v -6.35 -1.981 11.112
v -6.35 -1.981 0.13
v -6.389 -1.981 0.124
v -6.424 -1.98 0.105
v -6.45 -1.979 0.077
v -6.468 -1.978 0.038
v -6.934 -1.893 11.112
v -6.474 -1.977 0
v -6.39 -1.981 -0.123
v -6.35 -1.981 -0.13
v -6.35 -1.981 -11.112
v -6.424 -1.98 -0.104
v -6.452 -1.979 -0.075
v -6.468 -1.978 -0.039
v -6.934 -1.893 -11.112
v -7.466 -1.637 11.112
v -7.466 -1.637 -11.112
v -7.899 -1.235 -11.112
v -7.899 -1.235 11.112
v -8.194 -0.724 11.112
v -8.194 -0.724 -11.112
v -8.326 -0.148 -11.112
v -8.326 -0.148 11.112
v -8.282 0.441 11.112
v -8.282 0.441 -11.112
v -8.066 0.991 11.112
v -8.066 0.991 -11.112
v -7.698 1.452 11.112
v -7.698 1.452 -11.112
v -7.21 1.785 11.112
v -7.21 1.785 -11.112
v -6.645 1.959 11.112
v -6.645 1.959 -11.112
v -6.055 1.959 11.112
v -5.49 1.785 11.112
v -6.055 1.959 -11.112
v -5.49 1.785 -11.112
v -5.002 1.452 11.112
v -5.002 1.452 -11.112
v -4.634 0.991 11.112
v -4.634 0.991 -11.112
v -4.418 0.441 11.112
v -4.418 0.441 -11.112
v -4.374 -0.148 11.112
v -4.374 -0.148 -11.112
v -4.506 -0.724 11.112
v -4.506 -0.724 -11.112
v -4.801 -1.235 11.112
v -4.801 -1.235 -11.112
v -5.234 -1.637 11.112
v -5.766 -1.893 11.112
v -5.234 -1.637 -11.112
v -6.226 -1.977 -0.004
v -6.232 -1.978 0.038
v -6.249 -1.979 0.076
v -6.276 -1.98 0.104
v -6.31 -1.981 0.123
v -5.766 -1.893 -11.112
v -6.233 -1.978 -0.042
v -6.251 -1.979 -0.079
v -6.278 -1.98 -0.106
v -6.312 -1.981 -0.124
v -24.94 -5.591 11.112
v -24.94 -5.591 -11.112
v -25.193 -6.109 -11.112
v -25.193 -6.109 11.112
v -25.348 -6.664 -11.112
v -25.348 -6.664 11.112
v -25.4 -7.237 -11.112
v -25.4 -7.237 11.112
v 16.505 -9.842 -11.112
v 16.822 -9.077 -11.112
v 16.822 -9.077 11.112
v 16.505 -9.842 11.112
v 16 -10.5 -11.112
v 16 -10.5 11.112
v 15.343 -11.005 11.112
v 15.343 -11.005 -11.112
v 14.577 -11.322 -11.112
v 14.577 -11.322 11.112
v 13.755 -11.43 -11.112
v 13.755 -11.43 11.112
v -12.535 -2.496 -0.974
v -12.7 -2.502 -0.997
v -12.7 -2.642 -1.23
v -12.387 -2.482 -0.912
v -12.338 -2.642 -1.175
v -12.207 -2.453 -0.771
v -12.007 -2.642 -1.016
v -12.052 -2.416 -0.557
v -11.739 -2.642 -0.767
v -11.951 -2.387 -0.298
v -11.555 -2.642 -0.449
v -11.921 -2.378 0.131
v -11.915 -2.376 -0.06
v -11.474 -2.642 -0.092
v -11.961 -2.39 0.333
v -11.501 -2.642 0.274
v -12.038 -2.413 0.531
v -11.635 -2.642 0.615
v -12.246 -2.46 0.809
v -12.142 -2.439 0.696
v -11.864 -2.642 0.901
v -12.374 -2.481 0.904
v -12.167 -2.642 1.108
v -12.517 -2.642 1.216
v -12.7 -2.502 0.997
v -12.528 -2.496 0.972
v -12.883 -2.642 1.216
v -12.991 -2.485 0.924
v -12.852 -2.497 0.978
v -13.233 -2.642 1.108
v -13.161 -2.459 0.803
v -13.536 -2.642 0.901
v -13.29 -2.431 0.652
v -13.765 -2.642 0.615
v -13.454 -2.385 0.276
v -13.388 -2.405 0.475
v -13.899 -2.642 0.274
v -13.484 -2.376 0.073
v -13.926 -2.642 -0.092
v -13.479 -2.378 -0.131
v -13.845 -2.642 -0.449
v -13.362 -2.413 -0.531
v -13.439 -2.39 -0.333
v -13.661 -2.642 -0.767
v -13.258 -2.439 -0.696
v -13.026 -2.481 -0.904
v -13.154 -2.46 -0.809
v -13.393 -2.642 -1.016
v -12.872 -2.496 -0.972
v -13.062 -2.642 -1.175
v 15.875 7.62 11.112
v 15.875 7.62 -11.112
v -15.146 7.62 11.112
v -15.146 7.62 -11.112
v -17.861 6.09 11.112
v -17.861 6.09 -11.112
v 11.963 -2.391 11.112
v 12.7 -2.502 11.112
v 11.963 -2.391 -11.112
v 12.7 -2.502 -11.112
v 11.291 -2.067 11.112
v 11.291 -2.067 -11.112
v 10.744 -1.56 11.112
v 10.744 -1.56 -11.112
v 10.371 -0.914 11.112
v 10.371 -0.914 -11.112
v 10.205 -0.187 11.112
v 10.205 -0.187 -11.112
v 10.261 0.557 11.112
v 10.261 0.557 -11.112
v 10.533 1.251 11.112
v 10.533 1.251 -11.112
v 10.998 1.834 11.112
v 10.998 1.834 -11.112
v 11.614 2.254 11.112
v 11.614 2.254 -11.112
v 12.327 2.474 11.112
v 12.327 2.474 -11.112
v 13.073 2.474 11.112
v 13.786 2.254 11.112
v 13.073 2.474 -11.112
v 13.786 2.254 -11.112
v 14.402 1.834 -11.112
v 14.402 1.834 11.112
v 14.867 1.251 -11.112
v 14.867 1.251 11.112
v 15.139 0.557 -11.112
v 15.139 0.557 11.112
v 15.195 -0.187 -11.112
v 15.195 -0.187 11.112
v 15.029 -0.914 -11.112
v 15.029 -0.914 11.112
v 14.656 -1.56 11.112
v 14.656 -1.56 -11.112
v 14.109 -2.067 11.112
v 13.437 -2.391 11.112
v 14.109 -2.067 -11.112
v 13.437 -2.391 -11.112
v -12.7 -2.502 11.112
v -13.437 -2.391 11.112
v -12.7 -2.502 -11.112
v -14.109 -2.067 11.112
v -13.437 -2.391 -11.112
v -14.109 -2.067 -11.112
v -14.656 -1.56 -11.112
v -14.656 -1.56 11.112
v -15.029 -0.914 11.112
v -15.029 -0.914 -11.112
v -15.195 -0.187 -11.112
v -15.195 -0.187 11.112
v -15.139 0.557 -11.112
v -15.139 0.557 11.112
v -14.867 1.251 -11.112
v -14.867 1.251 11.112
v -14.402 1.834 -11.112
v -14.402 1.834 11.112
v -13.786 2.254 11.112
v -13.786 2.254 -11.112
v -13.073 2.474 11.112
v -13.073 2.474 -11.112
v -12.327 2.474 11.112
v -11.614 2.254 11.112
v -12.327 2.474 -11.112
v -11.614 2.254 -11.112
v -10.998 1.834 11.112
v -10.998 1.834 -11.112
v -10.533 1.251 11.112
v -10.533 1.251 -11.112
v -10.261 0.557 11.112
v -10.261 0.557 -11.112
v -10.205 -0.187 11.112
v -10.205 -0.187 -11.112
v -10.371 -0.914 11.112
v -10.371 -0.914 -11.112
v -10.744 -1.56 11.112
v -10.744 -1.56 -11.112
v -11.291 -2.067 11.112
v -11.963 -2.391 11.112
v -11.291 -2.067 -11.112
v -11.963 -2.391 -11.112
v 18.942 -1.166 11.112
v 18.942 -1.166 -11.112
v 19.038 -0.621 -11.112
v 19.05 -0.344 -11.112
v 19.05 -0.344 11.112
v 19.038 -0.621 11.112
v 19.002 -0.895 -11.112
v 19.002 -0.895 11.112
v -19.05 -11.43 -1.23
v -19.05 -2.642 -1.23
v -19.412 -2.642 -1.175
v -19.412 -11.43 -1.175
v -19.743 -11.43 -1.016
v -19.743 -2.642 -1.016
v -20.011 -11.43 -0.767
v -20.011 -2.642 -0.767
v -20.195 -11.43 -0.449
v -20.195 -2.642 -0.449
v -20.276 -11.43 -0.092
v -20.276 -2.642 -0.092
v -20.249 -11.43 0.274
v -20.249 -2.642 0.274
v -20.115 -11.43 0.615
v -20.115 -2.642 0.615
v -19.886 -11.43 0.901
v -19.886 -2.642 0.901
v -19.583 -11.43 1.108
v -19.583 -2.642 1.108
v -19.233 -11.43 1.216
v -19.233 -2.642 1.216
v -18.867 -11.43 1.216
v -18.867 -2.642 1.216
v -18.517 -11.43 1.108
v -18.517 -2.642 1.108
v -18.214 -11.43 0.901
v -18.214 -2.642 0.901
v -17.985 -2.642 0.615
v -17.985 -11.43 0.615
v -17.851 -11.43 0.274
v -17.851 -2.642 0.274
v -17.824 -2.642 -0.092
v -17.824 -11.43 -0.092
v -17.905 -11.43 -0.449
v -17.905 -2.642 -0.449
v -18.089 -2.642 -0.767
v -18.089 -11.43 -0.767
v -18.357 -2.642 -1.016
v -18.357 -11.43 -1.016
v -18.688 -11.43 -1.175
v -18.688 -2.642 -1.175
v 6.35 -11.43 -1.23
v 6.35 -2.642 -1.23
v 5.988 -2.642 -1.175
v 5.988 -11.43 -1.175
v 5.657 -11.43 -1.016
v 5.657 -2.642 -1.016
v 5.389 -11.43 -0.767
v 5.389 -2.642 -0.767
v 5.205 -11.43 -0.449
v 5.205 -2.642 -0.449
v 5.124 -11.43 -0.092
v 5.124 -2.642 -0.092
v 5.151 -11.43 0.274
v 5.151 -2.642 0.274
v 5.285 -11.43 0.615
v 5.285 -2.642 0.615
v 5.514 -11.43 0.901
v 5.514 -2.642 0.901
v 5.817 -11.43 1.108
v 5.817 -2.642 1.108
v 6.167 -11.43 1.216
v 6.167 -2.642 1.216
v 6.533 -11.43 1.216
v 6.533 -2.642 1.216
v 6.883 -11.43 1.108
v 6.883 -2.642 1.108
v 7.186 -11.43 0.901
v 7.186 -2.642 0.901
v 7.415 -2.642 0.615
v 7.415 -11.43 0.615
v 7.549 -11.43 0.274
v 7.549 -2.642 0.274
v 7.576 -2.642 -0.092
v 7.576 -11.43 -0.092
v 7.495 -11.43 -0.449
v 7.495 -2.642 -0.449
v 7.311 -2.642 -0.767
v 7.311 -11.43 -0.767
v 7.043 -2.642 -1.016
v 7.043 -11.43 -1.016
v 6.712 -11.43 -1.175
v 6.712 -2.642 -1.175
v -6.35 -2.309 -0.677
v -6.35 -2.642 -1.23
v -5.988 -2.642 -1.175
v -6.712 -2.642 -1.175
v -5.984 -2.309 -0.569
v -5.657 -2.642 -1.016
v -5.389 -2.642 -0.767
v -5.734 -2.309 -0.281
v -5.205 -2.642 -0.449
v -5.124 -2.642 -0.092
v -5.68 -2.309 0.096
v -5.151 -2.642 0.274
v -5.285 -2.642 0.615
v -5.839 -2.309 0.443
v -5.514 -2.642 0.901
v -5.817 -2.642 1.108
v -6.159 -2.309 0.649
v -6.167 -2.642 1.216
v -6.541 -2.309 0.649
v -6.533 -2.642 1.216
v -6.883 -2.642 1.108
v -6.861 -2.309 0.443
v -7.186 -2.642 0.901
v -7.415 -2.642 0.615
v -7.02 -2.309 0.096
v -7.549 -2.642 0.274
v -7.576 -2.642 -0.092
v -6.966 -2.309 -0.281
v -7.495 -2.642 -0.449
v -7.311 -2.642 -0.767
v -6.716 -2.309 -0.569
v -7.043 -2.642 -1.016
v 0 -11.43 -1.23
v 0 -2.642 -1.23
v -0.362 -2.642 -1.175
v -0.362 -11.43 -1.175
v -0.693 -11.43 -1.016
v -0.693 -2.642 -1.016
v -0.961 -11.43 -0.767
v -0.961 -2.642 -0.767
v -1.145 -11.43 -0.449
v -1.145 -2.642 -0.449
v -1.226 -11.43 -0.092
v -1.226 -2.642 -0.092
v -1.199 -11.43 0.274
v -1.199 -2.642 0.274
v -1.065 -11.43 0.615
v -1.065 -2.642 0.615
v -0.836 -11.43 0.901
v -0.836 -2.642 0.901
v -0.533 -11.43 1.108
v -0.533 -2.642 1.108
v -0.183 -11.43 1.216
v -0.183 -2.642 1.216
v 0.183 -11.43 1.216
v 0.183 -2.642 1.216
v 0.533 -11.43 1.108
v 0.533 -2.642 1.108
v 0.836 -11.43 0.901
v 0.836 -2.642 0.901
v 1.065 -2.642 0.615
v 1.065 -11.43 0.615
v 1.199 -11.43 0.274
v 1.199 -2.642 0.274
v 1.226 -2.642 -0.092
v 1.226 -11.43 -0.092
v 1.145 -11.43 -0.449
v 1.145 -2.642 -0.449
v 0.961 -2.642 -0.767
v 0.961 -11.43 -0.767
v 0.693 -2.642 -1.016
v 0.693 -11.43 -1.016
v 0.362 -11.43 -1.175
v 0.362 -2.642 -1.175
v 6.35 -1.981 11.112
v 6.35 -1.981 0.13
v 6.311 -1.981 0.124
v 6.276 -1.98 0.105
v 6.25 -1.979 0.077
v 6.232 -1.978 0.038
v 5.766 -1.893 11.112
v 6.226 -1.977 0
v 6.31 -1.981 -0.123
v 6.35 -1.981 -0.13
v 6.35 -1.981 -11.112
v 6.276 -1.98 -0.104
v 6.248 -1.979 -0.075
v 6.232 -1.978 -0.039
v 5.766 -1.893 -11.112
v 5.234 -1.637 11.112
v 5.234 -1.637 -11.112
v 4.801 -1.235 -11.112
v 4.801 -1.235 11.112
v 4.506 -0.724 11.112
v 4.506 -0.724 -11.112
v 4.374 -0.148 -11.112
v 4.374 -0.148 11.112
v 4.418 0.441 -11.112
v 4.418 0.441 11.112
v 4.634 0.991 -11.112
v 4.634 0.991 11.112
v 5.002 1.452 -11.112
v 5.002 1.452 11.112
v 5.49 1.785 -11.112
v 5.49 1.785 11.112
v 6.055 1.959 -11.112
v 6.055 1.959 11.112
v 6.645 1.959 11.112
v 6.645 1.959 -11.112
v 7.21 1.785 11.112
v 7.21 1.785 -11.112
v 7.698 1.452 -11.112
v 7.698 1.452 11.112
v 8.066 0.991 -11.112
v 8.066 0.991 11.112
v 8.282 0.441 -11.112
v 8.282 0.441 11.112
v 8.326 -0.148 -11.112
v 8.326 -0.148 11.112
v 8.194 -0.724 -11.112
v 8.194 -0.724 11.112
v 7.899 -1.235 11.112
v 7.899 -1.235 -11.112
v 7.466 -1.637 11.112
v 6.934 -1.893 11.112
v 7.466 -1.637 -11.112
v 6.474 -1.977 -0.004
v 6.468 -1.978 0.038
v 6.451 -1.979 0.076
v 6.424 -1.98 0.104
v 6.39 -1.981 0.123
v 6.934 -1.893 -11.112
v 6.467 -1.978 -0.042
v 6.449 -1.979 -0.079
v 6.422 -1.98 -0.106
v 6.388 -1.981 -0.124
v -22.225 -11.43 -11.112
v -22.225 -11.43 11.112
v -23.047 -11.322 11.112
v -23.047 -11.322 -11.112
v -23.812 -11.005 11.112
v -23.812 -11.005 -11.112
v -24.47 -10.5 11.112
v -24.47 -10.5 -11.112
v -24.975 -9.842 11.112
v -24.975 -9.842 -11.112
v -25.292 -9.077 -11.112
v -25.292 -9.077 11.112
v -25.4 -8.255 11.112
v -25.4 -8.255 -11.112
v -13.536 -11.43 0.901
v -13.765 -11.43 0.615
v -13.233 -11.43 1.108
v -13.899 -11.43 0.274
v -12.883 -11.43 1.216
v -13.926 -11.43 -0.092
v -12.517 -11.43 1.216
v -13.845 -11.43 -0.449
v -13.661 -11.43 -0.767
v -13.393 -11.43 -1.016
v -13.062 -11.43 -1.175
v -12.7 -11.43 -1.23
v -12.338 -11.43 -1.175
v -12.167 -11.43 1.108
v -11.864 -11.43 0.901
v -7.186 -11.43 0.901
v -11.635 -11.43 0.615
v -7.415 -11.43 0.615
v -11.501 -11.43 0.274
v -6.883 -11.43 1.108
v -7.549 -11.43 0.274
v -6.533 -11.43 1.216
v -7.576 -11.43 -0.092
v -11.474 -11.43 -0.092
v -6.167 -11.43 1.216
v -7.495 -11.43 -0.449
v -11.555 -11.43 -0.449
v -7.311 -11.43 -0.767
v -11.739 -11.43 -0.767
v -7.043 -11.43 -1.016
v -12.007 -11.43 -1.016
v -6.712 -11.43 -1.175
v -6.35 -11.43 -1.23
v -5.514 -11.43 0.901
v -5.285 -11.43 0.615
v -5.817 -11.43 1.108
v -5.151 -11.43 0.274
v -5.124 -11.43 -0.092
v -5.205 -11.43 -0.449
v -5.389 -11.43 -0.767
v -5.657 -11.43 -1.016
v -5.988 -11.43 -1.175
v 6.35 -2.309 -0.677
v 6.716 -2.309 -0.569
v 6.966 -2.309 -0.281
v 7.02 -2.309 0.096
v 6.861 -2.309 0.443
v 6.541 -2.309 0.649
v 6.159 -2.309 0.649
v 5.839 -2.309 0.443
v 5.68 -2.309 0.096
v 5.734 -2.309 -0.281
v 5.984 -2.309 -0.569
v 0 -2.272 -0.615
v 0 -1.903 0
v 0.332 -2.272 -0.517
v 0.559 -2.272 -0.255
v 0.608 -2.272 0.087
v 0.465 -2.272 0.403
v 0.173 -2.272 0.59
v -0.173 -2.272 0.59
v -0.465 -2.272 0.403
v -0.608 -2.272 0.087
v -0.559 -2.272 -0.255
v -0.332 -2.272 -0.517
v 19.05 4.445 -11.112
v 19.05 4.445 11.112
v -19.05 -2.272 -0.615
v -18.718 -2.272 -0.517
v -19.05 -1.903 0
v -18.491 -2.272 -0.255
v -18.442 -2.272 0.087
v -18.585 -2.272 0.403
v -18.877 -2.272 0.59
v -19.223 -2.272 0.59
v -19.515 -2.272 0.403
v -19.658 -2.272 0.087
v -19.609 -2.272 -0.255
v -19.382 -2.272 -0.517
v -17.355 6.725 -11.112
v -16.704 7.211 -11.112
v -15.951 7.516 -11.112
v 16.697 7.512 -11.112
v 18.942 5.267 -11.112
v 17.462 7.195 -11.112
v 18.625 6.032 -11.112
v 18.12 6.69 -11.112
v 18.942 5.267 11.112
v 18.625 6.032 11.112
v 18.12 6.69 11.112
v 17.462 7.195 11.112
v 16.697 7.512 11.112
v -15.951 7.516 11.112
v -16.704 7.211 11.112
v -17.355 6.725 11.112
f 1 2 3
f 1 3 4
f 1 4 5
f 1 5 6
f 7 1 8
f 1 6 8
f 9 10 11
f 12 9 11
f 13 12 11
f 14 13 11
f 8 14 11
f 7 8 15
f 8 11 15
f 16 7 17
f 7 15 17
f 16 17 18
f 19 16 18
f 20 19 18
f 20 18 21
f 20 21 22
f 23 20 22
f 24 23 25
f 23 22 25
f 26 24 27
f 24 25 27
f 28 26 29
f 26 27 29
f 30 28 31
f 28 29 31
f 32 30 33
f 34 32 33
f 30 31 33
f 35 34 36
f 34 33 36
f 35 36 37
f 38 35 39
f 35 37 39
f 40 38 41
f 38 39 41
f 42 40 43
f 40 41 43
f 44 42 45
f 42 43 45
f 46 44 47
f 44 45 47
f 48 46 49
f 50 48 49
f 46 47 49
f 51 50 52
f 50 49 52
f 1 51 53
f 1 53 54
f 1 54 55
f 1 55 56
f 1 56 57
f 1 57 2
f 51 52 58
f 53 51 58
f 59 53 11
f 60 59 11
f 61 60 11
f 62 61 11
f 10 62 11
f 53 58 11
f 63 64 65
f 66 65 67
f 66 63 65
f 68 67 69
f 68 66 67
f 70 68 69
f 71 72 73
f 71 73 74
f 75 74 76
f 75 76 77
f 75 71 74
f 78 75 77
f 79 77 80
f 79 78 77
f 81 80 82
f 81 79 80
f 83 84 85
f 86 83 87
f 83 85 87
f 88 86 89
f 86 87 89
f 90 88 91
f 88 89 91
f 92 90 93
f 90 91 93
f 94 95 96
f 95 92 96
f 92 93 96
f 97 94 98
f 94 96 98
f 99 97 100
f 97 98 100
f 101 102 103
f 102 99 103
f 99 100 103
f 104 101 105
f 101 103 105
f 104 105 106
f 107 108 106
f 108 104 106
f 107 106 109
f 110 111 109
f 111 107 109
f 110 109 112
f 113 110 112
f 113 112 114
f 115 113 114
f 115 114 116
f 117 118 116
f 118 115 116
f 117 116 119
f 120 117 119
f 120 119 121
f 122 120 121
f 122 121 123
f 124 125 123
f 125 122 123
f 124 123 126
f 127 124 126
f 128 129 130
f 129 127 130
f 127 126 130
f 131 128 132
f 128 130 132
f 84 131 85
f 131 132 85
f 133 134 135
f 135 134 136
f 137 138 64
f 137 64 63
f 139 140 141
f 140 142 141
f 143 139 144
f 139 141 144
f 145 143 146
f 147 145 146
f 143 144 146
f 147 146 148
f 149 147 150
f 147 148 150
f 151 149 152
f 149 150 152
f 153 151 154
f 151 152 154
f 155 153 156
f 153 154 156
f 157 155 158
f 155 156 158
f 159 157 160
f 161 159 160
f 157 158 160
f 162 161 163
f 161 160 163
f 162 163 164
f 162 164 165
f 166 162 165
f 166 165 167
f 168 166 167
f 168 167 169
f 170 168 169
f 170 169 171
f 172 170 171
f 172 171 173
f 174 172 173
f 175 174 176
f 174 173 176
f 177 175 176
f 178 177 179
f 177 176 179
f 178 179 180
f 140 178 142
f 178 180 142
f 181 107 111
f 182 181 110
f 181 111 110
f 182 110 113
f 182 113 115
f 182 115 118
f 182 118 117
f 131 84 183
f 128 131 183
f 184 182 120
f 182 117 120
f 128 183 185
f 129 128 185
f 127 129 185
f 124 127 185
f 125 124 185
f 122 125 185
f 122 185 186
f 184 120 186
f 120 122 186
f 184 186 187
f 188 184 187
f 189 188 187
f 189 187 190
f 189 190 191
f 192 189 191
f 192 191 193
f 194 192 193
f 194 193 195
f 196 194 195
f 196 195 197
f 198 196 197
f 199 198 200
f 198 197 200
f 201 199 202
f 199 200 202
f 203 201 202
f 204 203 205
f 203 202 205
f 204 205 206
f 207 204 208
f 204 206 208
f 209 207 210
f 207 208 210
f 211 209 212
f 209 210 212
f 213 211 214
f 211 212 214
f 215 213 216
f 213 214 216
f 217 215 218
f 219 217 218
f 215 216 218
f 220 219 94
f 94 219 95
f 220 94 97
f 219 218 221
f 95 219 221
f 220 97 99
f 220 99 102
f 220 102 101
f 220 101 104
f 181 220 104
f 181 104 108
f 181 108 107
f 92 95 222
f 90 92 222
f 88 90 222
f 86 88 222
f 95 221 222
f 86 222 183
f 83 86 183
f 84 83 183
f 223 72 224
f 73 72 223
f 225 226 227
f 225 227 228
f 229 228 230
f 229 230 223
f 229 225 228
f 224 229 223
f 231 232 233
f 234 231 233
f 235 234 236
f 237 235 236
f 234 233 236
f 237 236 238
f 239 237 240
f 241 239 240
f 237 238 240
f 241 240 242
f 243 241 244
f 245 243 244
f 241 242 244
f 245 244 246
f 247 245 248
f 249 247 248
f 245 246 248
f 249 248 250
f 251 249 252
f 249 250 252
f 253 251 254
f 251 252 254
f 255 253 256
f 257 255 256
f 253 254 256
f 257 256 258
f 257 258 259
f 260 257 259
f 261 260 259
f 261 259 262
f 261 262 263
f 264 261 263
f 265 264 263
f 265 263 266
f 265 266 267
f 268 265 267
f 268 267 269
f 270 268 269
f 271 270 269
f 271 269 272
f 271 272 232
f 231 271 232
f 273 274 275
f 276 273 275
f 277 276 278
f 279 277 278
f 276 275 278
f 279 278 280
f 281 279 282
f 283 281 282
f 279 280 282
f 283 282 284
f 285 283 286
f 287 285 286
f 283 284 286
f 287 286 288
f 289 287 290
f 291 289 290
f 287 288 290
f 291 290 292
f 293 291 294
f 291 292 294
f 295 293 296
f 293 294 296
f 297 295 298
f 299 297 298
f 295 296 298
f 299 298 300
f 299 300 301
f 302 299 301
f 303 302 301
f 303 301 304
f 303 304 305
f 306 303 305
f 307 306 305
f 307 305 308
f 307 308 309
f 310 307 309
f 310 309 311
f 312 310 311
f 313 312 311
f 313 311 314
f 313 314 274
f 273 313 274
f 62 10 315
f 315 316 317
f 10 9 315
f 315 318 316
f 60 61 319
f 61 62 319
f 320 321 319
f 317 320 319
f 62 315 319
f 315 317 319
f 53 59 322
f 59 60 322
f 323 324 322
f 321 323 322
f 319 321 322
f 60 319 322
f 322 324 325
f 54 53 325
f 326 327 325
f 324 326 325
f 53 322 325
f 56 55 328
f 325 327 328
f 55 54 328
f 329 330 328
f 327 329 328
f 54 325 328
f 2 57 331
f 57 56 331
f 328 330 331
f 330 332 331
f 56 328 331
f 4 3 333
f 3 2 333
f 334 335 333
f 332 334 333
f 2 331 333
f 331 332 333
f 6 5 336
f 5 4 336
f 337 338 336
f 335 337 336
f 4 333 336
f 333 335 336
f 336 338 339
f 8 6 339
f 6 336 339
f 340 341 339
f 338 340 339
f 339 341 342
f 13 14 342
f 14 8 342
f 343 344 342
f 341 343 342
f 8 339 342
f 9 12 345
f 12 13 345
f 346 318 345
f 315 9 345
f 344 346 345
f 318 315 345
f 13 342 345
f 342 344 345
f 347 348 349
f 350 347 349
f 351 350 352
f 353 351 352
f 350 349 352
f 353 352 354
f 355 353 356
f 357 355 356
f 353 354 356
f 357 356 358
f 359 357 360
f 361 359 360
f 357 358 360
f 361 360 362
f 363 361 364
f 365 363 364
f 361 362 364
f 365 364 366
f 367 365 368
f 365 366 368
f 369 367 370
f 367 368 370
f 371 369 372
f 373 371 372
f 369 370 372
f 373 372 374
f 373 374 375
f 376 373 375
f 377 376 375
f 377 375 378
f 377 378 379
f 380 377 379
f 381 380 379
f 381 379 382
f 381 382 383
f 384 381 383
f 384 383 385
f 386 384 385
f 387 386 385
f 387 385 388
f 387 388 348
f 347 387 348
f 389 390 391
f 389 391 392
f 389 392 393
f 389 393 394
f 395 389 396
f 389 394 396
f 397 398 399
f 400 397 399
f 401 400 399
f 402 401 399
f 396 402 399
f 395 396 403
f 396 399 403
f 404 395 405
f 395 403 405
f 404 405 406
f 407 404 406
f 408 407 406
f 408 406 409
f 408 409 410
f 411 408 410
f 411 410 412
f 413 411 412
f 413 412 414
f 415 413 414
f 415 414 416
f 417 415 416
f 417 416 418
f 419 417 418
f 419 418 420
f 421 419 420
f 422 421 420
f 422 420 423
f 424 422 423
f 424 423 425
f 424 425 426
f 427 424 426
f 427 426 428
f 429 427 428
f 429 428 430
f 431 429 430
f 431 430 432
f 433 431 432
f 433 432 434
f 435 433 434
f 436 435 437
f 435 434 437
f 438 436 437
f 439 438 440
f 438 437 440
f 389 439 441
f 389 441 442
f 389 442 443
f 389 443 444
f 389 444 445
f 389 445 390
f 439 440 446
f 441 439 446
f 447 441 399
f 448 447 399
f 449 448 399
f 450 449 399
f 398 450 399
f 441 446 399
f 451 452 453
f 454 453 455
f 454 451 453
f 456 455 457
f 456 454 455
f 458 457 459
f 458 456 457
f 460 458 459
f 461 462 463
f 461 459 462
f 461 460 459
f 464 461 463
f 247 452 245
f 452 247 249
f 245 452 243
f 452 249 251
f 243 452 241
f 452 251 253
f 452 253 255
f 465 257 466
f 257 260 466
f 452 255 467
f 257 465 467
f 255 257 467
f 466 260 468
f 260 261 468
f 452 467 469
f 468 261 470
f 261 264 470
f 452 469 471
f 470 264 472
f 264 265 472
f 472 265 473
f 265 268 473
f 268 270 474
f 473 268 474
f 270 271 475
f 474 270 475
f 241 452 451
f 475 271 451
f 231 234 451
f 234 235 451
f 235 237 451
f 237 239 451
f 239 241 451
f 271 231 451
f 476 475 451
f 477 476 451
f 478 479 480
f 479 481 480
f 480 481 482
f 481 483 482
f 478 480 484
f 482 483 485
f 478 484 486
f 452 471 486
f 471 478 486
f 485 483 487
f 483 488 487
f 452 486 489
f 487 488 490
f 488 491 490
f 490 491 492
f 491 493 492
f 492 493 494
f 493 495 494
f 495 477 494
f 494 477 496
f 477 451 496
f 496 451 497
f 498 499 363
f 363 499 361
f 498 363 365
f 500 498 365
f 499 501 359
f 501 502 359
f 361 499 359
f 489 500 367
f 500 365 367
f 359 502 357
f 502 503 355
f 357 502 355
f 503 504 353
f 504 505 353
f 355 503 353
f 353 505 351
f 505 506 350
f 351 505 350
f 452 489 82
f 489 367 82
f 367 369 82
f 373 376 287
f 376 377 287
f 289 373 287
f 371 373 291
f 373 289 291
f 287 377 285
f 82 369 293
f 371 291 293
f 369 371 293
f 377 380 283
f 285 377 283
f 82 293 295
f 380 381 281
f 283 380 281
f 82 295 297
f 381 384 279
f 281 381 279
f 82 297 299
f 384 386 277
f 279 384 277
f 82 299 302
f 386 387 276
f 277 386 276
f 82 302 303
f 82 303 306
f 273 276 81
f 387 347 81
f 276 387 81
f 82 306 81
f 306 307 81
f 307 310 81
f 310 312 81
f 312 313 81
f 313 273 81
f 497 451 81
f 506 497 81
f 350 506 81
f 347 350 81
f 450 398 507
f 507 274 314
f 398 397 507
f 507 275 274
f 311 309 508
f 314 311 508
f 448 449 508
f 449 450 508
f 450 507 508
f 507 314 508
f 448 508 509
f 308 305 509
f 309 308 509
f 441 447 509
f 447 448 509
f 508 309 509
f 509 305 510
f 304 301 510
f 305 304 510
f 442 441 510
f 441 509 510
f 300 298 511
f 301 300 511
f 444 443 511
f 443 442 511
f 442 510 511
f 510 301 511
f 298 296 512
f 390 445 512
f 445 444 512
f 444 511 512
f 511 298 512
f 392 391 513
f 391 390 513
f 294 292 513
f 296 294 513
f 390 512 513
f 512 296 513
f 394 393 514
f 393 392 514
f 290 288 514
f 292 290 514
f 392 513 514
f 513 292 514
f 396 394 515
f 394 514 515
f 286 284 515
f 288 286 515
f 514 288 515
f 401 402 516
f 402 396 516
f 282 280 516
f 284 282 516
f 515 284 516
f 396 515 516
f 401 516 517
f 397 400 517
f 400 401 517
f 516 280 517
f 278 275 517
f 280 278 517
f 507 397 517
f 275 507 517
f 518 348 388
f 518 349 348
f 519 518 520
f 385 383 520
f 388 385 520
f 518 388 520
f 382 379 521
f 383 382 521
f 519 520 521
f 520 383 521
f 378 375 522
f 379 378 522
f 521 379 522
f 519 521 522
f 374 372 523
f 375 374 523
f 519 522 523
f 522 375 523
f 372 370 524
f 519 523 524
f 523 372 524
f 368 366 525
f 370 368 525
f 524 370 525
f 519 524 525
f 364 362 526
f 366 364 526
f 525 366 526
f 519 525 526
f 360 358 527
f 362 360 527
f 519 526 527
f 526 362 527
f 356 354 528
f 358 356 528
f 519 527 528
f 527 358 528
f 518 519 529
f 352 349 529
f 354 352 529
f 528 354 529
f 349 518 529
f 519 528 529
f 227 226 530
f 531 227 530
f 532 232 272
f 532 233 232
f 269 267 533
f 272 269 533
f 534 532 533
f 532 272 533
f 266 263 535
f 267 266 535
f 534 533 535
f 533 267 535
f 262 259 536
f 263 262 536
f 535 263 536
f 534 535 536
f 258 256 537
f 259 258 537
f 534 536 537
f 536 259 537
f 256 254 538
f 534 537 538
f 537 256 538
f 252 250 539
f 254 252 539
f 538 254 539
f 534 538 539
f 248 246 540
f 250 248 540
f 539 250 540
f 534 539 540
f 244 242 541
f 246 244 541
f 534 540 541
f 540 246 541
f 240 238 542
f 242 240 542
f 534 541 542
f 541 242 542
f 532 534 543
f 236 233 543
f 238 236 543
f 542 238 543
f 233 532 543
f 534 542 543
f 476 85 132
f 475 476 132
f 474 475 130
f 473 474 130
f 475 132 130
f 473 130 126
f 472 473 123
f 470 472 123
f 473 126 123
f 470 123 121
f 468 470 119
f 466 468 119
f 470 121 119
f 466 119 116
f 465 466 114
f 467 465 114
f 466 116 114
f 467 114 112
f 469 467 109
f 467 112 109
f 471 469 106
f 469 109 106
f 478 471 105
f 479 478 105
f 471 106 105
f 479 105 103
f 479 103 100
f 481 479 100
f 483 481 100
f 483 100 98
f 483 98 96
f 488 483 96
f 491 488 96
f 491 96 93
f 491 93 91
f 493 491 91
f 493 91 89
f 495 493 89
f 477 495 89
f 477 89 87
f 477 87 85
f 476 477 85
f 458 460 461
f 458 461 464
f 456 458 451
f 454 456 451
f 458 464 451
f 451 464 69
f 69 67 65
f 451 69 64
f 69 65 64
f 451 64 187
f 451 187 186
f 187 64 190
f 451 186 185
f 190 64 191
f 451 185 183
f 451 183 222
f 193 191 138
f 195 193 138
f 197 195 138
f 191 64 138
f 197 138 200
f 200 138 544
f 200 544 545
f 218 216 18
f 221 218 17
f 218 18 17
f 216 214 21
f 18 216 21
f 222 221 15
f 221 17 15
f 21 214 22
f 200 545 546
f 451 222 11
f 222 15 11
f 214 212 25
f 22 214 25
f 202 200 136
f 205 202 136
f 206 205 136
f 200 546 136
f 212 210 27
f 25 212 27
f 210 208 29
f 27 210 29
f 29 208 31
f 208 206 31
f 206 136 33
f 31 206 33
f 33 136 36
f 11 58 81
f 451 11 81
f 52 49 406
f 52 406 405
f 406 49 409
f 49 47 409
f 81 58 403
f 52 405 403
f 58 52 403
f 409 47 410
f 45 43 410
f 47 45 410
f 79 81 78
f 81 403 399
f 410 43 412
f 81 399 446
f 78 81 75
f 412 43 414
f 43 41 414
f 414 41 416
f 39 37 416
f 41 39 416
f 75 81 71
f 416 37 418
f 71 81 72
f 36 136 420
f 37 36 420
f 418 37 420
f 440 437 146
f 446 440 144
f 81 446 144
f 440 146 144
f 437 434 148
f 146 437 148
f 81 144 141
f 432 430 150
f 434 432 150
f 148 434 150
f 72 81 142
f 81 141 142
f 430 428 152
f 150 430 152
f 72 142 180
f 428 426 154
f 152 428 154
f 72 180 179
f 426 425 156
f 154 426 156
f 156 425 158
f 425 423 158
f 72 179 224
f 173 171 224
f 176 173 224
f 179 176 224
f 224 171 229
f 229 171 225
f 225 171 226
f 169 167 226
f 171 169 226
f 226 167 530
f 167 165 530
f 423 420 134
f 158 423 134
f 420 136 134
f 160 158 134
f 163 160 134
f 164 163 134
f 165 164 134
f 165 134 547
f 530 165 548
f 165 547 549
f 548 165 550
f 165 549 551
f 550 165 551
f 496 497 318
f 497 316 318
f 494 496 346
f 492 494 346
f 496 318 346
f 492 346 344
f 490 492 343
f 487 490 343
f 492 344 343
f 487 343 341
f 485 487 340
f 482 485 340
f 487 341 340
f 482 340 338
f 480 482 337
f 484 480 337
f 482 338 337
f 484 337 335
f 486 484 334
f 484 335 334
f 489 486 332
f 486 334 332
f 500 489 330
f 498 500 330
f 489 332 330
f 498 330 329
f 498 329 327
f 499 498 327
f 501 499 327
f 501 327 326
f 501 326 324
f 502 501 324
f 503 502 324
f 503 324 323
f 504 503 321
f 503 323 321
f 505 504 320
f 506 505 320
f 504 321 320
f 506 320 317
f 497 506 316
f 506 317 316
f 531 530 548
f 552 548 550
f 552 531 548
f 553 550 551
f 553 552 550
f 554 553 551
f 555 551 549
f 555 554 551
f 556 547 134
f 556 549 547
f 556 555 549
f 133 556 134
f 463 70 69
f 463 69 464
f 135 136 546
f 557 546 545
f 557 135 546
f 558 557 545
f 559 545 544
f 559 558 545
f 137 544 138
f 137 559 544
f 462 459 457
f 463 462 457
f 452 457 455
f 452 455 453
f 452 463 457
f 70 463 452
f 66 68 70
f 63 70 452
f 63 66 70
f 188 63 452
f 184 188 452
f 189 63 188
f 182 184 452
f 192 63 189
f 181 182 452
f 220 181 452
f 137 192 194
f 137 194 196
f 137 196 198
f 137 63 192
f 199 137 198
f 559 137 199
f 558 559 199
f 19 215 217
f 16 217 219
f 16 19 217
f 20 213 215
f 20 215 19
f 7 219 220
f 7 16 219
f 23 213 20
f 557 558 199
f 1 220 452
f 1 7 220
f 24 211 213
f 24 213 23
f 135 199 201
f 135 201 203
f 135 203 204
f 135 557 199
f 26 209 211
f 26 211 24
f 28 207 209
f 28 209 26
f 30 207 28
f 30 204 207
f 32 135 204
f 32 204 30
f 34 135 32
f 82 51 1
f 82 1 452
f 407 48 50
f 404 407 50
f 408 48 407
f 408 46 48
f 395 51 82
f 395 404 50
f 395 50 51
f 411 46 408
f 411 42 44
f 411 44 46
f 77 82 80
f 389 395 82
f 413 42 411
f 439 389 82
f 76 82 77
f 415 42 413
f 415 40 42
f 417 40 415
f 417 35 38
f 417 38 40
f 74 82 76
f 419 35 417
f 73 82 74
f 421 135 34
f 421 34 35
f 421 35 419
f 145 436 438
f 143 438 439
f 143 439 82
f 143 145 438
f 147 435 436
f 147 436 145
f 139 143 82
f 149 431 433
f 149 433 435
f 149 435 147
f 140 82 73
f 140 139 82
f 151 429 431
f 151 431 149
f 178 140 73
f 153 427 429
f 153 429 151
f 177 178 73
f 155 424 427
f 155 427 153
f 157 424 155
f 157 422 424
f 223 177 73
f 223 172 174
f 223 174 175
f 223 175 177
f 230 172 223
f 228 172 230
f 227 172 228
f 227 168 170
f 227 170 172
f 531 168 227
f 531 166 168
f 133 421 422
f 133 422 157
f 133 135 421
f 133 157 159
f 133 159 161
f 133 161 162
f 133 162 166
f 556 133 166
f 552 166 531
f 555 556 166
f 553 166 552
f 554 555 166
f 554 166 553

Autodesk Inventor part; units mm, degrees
ref_plane "YZ Plane" through (0, 0, 0) normal (1, 0, 0) x (0, 1, 0)
ref_plane "XZ Plane" through (0, 0, 0) normal (0, 1, 0) x (-1, 0, 0)
ref_plane "XY Plane" through (0, 0, 0) normal (0, 0, 1) x (1, 0, 0)
sketch "Sketch1" plane through (0, 0, 0) normal (0, 0, 1) x (1, 0, 0)
  line L0 (19.05, 7.62) -> (-25.4, 7.62)
  line L1 (-25.4, 7.62) -> (-25.4, -11.43)
  line L2 (-25.4, -11.43) -> (19.05, -11.43)
  line L3 (19.05, -11.43) -> (19.05, 7.62)
  line L4 (19.05, 7.62) -> (-25.4, -11.43) construction
  line L5 (-25.4, 7.62) -> (19.05, -11.43) construction
  line L6 (0, 11.43) -> (0, -15.24) construction
  line L7 (-34.29, 0) -> (27.94, 0) construction
  point P0 (-3.175, -1.905)
  dimension "d0" = 19.05
  dimension "d1" = 44.45
  dimension "d56" = 25.4
  dimension "d93" = 11.43
extrude "Extrusion1" add sketch "Sketch1" along normal mid plane 22.225
sketch "Sketch3" plane through (0, 0, 11.1125) normal (0, 0, 1) x (1, 0, 0)
  line L0 (-12.7, 0) -> (12.7, 0) construction
  point P0 (0, 0)
  point P1 (0, 0)
  dimension "d35" = 25.4
hole "Hole1" at (-12.7, 0, 11.1125) at (12.7, 0, 11.1125) direction (0, 0, -1) diameter 5.0038 end through all clearance for "H7 - STANDARD FIT" size "5" standard "CL-DOWEL-MET"
sketch "Sketch4" plane through (0, 0, 11.1125) normal (0, 0, 1) x (1, 0, 0)
  line L0 (-6.35, 0) -> (6.35, 0) construction
  point P0 (0, 0)
  point P1 (0, 0)
  dimension "d43" = 12.7
hole "Hole2" at (-6.35, 0, 11.1125) at (6.35, 0, 11.1125) direction (0, 0, -1) diameter 3.9624 end through all thread size "10-32 UNF" class "2B" standard "ANSI Unified Screw Threads"
sketch "Sketch6" plane through (-25.4, -11.43, 11.1125) normal (0, -1, 0) x (1, 0, 0)
  line L0 (25.4, -11.1125) -> (6.35, -11.1125) construction
  point P0 (12.7, -11.1125)
  point P1 (12.7, -11.1125)
  point P2 (19.05, -11.1125)
  point P3 (19.05, -11.1125)
  point P4 (25.4, -11.1125)
  point P5 (25.4, -11.1125)
  point P6 (31.75, -11.1125)
  point P7 (31.75, -11.1125)
  point P8 (25.4, -11.1125)
  dimension "d83" = 19.05
  dimension "d84" = 6.35
hole "Hole4" at (-19.05, -11.43, 0) at (-12.7, -11.43, 0) at (-6.35, -11.43, 0) at (0, -11.43, 0) at (6.35, -11.43, 0) direction (0, 1, 0) diameter 2.459 depth 8.7884 tip angle 118 thread size "M3x0.5" class "6H" standard "ANSI Metric M Profile"
chamfer "Chamfer2" distance 10.668 angle 15 1 edges at (19.05, -11.43, 0) measured on face at (19.05, -5.08, -3.7042)
chamfer "Chamfer3" distance 13.97 angle 31.215 1 edges at (-25.4, 7.62, 0) measured on face at (-25.4, -5.08, 3.7042)
fillet "Fillet1" radius 3.175 6 edges at (16.1915, -11.43, 0) (-25.4, -11.43, 0) (-25.4, -6.35, 0) (-16.9346, 7.62, 0) (19.05, 7.62, 0) (19.05, -0.762, 0)
properties part number "BRACE,CHAIN,#25,ELEVATOR" material "Aluminum 7075"
